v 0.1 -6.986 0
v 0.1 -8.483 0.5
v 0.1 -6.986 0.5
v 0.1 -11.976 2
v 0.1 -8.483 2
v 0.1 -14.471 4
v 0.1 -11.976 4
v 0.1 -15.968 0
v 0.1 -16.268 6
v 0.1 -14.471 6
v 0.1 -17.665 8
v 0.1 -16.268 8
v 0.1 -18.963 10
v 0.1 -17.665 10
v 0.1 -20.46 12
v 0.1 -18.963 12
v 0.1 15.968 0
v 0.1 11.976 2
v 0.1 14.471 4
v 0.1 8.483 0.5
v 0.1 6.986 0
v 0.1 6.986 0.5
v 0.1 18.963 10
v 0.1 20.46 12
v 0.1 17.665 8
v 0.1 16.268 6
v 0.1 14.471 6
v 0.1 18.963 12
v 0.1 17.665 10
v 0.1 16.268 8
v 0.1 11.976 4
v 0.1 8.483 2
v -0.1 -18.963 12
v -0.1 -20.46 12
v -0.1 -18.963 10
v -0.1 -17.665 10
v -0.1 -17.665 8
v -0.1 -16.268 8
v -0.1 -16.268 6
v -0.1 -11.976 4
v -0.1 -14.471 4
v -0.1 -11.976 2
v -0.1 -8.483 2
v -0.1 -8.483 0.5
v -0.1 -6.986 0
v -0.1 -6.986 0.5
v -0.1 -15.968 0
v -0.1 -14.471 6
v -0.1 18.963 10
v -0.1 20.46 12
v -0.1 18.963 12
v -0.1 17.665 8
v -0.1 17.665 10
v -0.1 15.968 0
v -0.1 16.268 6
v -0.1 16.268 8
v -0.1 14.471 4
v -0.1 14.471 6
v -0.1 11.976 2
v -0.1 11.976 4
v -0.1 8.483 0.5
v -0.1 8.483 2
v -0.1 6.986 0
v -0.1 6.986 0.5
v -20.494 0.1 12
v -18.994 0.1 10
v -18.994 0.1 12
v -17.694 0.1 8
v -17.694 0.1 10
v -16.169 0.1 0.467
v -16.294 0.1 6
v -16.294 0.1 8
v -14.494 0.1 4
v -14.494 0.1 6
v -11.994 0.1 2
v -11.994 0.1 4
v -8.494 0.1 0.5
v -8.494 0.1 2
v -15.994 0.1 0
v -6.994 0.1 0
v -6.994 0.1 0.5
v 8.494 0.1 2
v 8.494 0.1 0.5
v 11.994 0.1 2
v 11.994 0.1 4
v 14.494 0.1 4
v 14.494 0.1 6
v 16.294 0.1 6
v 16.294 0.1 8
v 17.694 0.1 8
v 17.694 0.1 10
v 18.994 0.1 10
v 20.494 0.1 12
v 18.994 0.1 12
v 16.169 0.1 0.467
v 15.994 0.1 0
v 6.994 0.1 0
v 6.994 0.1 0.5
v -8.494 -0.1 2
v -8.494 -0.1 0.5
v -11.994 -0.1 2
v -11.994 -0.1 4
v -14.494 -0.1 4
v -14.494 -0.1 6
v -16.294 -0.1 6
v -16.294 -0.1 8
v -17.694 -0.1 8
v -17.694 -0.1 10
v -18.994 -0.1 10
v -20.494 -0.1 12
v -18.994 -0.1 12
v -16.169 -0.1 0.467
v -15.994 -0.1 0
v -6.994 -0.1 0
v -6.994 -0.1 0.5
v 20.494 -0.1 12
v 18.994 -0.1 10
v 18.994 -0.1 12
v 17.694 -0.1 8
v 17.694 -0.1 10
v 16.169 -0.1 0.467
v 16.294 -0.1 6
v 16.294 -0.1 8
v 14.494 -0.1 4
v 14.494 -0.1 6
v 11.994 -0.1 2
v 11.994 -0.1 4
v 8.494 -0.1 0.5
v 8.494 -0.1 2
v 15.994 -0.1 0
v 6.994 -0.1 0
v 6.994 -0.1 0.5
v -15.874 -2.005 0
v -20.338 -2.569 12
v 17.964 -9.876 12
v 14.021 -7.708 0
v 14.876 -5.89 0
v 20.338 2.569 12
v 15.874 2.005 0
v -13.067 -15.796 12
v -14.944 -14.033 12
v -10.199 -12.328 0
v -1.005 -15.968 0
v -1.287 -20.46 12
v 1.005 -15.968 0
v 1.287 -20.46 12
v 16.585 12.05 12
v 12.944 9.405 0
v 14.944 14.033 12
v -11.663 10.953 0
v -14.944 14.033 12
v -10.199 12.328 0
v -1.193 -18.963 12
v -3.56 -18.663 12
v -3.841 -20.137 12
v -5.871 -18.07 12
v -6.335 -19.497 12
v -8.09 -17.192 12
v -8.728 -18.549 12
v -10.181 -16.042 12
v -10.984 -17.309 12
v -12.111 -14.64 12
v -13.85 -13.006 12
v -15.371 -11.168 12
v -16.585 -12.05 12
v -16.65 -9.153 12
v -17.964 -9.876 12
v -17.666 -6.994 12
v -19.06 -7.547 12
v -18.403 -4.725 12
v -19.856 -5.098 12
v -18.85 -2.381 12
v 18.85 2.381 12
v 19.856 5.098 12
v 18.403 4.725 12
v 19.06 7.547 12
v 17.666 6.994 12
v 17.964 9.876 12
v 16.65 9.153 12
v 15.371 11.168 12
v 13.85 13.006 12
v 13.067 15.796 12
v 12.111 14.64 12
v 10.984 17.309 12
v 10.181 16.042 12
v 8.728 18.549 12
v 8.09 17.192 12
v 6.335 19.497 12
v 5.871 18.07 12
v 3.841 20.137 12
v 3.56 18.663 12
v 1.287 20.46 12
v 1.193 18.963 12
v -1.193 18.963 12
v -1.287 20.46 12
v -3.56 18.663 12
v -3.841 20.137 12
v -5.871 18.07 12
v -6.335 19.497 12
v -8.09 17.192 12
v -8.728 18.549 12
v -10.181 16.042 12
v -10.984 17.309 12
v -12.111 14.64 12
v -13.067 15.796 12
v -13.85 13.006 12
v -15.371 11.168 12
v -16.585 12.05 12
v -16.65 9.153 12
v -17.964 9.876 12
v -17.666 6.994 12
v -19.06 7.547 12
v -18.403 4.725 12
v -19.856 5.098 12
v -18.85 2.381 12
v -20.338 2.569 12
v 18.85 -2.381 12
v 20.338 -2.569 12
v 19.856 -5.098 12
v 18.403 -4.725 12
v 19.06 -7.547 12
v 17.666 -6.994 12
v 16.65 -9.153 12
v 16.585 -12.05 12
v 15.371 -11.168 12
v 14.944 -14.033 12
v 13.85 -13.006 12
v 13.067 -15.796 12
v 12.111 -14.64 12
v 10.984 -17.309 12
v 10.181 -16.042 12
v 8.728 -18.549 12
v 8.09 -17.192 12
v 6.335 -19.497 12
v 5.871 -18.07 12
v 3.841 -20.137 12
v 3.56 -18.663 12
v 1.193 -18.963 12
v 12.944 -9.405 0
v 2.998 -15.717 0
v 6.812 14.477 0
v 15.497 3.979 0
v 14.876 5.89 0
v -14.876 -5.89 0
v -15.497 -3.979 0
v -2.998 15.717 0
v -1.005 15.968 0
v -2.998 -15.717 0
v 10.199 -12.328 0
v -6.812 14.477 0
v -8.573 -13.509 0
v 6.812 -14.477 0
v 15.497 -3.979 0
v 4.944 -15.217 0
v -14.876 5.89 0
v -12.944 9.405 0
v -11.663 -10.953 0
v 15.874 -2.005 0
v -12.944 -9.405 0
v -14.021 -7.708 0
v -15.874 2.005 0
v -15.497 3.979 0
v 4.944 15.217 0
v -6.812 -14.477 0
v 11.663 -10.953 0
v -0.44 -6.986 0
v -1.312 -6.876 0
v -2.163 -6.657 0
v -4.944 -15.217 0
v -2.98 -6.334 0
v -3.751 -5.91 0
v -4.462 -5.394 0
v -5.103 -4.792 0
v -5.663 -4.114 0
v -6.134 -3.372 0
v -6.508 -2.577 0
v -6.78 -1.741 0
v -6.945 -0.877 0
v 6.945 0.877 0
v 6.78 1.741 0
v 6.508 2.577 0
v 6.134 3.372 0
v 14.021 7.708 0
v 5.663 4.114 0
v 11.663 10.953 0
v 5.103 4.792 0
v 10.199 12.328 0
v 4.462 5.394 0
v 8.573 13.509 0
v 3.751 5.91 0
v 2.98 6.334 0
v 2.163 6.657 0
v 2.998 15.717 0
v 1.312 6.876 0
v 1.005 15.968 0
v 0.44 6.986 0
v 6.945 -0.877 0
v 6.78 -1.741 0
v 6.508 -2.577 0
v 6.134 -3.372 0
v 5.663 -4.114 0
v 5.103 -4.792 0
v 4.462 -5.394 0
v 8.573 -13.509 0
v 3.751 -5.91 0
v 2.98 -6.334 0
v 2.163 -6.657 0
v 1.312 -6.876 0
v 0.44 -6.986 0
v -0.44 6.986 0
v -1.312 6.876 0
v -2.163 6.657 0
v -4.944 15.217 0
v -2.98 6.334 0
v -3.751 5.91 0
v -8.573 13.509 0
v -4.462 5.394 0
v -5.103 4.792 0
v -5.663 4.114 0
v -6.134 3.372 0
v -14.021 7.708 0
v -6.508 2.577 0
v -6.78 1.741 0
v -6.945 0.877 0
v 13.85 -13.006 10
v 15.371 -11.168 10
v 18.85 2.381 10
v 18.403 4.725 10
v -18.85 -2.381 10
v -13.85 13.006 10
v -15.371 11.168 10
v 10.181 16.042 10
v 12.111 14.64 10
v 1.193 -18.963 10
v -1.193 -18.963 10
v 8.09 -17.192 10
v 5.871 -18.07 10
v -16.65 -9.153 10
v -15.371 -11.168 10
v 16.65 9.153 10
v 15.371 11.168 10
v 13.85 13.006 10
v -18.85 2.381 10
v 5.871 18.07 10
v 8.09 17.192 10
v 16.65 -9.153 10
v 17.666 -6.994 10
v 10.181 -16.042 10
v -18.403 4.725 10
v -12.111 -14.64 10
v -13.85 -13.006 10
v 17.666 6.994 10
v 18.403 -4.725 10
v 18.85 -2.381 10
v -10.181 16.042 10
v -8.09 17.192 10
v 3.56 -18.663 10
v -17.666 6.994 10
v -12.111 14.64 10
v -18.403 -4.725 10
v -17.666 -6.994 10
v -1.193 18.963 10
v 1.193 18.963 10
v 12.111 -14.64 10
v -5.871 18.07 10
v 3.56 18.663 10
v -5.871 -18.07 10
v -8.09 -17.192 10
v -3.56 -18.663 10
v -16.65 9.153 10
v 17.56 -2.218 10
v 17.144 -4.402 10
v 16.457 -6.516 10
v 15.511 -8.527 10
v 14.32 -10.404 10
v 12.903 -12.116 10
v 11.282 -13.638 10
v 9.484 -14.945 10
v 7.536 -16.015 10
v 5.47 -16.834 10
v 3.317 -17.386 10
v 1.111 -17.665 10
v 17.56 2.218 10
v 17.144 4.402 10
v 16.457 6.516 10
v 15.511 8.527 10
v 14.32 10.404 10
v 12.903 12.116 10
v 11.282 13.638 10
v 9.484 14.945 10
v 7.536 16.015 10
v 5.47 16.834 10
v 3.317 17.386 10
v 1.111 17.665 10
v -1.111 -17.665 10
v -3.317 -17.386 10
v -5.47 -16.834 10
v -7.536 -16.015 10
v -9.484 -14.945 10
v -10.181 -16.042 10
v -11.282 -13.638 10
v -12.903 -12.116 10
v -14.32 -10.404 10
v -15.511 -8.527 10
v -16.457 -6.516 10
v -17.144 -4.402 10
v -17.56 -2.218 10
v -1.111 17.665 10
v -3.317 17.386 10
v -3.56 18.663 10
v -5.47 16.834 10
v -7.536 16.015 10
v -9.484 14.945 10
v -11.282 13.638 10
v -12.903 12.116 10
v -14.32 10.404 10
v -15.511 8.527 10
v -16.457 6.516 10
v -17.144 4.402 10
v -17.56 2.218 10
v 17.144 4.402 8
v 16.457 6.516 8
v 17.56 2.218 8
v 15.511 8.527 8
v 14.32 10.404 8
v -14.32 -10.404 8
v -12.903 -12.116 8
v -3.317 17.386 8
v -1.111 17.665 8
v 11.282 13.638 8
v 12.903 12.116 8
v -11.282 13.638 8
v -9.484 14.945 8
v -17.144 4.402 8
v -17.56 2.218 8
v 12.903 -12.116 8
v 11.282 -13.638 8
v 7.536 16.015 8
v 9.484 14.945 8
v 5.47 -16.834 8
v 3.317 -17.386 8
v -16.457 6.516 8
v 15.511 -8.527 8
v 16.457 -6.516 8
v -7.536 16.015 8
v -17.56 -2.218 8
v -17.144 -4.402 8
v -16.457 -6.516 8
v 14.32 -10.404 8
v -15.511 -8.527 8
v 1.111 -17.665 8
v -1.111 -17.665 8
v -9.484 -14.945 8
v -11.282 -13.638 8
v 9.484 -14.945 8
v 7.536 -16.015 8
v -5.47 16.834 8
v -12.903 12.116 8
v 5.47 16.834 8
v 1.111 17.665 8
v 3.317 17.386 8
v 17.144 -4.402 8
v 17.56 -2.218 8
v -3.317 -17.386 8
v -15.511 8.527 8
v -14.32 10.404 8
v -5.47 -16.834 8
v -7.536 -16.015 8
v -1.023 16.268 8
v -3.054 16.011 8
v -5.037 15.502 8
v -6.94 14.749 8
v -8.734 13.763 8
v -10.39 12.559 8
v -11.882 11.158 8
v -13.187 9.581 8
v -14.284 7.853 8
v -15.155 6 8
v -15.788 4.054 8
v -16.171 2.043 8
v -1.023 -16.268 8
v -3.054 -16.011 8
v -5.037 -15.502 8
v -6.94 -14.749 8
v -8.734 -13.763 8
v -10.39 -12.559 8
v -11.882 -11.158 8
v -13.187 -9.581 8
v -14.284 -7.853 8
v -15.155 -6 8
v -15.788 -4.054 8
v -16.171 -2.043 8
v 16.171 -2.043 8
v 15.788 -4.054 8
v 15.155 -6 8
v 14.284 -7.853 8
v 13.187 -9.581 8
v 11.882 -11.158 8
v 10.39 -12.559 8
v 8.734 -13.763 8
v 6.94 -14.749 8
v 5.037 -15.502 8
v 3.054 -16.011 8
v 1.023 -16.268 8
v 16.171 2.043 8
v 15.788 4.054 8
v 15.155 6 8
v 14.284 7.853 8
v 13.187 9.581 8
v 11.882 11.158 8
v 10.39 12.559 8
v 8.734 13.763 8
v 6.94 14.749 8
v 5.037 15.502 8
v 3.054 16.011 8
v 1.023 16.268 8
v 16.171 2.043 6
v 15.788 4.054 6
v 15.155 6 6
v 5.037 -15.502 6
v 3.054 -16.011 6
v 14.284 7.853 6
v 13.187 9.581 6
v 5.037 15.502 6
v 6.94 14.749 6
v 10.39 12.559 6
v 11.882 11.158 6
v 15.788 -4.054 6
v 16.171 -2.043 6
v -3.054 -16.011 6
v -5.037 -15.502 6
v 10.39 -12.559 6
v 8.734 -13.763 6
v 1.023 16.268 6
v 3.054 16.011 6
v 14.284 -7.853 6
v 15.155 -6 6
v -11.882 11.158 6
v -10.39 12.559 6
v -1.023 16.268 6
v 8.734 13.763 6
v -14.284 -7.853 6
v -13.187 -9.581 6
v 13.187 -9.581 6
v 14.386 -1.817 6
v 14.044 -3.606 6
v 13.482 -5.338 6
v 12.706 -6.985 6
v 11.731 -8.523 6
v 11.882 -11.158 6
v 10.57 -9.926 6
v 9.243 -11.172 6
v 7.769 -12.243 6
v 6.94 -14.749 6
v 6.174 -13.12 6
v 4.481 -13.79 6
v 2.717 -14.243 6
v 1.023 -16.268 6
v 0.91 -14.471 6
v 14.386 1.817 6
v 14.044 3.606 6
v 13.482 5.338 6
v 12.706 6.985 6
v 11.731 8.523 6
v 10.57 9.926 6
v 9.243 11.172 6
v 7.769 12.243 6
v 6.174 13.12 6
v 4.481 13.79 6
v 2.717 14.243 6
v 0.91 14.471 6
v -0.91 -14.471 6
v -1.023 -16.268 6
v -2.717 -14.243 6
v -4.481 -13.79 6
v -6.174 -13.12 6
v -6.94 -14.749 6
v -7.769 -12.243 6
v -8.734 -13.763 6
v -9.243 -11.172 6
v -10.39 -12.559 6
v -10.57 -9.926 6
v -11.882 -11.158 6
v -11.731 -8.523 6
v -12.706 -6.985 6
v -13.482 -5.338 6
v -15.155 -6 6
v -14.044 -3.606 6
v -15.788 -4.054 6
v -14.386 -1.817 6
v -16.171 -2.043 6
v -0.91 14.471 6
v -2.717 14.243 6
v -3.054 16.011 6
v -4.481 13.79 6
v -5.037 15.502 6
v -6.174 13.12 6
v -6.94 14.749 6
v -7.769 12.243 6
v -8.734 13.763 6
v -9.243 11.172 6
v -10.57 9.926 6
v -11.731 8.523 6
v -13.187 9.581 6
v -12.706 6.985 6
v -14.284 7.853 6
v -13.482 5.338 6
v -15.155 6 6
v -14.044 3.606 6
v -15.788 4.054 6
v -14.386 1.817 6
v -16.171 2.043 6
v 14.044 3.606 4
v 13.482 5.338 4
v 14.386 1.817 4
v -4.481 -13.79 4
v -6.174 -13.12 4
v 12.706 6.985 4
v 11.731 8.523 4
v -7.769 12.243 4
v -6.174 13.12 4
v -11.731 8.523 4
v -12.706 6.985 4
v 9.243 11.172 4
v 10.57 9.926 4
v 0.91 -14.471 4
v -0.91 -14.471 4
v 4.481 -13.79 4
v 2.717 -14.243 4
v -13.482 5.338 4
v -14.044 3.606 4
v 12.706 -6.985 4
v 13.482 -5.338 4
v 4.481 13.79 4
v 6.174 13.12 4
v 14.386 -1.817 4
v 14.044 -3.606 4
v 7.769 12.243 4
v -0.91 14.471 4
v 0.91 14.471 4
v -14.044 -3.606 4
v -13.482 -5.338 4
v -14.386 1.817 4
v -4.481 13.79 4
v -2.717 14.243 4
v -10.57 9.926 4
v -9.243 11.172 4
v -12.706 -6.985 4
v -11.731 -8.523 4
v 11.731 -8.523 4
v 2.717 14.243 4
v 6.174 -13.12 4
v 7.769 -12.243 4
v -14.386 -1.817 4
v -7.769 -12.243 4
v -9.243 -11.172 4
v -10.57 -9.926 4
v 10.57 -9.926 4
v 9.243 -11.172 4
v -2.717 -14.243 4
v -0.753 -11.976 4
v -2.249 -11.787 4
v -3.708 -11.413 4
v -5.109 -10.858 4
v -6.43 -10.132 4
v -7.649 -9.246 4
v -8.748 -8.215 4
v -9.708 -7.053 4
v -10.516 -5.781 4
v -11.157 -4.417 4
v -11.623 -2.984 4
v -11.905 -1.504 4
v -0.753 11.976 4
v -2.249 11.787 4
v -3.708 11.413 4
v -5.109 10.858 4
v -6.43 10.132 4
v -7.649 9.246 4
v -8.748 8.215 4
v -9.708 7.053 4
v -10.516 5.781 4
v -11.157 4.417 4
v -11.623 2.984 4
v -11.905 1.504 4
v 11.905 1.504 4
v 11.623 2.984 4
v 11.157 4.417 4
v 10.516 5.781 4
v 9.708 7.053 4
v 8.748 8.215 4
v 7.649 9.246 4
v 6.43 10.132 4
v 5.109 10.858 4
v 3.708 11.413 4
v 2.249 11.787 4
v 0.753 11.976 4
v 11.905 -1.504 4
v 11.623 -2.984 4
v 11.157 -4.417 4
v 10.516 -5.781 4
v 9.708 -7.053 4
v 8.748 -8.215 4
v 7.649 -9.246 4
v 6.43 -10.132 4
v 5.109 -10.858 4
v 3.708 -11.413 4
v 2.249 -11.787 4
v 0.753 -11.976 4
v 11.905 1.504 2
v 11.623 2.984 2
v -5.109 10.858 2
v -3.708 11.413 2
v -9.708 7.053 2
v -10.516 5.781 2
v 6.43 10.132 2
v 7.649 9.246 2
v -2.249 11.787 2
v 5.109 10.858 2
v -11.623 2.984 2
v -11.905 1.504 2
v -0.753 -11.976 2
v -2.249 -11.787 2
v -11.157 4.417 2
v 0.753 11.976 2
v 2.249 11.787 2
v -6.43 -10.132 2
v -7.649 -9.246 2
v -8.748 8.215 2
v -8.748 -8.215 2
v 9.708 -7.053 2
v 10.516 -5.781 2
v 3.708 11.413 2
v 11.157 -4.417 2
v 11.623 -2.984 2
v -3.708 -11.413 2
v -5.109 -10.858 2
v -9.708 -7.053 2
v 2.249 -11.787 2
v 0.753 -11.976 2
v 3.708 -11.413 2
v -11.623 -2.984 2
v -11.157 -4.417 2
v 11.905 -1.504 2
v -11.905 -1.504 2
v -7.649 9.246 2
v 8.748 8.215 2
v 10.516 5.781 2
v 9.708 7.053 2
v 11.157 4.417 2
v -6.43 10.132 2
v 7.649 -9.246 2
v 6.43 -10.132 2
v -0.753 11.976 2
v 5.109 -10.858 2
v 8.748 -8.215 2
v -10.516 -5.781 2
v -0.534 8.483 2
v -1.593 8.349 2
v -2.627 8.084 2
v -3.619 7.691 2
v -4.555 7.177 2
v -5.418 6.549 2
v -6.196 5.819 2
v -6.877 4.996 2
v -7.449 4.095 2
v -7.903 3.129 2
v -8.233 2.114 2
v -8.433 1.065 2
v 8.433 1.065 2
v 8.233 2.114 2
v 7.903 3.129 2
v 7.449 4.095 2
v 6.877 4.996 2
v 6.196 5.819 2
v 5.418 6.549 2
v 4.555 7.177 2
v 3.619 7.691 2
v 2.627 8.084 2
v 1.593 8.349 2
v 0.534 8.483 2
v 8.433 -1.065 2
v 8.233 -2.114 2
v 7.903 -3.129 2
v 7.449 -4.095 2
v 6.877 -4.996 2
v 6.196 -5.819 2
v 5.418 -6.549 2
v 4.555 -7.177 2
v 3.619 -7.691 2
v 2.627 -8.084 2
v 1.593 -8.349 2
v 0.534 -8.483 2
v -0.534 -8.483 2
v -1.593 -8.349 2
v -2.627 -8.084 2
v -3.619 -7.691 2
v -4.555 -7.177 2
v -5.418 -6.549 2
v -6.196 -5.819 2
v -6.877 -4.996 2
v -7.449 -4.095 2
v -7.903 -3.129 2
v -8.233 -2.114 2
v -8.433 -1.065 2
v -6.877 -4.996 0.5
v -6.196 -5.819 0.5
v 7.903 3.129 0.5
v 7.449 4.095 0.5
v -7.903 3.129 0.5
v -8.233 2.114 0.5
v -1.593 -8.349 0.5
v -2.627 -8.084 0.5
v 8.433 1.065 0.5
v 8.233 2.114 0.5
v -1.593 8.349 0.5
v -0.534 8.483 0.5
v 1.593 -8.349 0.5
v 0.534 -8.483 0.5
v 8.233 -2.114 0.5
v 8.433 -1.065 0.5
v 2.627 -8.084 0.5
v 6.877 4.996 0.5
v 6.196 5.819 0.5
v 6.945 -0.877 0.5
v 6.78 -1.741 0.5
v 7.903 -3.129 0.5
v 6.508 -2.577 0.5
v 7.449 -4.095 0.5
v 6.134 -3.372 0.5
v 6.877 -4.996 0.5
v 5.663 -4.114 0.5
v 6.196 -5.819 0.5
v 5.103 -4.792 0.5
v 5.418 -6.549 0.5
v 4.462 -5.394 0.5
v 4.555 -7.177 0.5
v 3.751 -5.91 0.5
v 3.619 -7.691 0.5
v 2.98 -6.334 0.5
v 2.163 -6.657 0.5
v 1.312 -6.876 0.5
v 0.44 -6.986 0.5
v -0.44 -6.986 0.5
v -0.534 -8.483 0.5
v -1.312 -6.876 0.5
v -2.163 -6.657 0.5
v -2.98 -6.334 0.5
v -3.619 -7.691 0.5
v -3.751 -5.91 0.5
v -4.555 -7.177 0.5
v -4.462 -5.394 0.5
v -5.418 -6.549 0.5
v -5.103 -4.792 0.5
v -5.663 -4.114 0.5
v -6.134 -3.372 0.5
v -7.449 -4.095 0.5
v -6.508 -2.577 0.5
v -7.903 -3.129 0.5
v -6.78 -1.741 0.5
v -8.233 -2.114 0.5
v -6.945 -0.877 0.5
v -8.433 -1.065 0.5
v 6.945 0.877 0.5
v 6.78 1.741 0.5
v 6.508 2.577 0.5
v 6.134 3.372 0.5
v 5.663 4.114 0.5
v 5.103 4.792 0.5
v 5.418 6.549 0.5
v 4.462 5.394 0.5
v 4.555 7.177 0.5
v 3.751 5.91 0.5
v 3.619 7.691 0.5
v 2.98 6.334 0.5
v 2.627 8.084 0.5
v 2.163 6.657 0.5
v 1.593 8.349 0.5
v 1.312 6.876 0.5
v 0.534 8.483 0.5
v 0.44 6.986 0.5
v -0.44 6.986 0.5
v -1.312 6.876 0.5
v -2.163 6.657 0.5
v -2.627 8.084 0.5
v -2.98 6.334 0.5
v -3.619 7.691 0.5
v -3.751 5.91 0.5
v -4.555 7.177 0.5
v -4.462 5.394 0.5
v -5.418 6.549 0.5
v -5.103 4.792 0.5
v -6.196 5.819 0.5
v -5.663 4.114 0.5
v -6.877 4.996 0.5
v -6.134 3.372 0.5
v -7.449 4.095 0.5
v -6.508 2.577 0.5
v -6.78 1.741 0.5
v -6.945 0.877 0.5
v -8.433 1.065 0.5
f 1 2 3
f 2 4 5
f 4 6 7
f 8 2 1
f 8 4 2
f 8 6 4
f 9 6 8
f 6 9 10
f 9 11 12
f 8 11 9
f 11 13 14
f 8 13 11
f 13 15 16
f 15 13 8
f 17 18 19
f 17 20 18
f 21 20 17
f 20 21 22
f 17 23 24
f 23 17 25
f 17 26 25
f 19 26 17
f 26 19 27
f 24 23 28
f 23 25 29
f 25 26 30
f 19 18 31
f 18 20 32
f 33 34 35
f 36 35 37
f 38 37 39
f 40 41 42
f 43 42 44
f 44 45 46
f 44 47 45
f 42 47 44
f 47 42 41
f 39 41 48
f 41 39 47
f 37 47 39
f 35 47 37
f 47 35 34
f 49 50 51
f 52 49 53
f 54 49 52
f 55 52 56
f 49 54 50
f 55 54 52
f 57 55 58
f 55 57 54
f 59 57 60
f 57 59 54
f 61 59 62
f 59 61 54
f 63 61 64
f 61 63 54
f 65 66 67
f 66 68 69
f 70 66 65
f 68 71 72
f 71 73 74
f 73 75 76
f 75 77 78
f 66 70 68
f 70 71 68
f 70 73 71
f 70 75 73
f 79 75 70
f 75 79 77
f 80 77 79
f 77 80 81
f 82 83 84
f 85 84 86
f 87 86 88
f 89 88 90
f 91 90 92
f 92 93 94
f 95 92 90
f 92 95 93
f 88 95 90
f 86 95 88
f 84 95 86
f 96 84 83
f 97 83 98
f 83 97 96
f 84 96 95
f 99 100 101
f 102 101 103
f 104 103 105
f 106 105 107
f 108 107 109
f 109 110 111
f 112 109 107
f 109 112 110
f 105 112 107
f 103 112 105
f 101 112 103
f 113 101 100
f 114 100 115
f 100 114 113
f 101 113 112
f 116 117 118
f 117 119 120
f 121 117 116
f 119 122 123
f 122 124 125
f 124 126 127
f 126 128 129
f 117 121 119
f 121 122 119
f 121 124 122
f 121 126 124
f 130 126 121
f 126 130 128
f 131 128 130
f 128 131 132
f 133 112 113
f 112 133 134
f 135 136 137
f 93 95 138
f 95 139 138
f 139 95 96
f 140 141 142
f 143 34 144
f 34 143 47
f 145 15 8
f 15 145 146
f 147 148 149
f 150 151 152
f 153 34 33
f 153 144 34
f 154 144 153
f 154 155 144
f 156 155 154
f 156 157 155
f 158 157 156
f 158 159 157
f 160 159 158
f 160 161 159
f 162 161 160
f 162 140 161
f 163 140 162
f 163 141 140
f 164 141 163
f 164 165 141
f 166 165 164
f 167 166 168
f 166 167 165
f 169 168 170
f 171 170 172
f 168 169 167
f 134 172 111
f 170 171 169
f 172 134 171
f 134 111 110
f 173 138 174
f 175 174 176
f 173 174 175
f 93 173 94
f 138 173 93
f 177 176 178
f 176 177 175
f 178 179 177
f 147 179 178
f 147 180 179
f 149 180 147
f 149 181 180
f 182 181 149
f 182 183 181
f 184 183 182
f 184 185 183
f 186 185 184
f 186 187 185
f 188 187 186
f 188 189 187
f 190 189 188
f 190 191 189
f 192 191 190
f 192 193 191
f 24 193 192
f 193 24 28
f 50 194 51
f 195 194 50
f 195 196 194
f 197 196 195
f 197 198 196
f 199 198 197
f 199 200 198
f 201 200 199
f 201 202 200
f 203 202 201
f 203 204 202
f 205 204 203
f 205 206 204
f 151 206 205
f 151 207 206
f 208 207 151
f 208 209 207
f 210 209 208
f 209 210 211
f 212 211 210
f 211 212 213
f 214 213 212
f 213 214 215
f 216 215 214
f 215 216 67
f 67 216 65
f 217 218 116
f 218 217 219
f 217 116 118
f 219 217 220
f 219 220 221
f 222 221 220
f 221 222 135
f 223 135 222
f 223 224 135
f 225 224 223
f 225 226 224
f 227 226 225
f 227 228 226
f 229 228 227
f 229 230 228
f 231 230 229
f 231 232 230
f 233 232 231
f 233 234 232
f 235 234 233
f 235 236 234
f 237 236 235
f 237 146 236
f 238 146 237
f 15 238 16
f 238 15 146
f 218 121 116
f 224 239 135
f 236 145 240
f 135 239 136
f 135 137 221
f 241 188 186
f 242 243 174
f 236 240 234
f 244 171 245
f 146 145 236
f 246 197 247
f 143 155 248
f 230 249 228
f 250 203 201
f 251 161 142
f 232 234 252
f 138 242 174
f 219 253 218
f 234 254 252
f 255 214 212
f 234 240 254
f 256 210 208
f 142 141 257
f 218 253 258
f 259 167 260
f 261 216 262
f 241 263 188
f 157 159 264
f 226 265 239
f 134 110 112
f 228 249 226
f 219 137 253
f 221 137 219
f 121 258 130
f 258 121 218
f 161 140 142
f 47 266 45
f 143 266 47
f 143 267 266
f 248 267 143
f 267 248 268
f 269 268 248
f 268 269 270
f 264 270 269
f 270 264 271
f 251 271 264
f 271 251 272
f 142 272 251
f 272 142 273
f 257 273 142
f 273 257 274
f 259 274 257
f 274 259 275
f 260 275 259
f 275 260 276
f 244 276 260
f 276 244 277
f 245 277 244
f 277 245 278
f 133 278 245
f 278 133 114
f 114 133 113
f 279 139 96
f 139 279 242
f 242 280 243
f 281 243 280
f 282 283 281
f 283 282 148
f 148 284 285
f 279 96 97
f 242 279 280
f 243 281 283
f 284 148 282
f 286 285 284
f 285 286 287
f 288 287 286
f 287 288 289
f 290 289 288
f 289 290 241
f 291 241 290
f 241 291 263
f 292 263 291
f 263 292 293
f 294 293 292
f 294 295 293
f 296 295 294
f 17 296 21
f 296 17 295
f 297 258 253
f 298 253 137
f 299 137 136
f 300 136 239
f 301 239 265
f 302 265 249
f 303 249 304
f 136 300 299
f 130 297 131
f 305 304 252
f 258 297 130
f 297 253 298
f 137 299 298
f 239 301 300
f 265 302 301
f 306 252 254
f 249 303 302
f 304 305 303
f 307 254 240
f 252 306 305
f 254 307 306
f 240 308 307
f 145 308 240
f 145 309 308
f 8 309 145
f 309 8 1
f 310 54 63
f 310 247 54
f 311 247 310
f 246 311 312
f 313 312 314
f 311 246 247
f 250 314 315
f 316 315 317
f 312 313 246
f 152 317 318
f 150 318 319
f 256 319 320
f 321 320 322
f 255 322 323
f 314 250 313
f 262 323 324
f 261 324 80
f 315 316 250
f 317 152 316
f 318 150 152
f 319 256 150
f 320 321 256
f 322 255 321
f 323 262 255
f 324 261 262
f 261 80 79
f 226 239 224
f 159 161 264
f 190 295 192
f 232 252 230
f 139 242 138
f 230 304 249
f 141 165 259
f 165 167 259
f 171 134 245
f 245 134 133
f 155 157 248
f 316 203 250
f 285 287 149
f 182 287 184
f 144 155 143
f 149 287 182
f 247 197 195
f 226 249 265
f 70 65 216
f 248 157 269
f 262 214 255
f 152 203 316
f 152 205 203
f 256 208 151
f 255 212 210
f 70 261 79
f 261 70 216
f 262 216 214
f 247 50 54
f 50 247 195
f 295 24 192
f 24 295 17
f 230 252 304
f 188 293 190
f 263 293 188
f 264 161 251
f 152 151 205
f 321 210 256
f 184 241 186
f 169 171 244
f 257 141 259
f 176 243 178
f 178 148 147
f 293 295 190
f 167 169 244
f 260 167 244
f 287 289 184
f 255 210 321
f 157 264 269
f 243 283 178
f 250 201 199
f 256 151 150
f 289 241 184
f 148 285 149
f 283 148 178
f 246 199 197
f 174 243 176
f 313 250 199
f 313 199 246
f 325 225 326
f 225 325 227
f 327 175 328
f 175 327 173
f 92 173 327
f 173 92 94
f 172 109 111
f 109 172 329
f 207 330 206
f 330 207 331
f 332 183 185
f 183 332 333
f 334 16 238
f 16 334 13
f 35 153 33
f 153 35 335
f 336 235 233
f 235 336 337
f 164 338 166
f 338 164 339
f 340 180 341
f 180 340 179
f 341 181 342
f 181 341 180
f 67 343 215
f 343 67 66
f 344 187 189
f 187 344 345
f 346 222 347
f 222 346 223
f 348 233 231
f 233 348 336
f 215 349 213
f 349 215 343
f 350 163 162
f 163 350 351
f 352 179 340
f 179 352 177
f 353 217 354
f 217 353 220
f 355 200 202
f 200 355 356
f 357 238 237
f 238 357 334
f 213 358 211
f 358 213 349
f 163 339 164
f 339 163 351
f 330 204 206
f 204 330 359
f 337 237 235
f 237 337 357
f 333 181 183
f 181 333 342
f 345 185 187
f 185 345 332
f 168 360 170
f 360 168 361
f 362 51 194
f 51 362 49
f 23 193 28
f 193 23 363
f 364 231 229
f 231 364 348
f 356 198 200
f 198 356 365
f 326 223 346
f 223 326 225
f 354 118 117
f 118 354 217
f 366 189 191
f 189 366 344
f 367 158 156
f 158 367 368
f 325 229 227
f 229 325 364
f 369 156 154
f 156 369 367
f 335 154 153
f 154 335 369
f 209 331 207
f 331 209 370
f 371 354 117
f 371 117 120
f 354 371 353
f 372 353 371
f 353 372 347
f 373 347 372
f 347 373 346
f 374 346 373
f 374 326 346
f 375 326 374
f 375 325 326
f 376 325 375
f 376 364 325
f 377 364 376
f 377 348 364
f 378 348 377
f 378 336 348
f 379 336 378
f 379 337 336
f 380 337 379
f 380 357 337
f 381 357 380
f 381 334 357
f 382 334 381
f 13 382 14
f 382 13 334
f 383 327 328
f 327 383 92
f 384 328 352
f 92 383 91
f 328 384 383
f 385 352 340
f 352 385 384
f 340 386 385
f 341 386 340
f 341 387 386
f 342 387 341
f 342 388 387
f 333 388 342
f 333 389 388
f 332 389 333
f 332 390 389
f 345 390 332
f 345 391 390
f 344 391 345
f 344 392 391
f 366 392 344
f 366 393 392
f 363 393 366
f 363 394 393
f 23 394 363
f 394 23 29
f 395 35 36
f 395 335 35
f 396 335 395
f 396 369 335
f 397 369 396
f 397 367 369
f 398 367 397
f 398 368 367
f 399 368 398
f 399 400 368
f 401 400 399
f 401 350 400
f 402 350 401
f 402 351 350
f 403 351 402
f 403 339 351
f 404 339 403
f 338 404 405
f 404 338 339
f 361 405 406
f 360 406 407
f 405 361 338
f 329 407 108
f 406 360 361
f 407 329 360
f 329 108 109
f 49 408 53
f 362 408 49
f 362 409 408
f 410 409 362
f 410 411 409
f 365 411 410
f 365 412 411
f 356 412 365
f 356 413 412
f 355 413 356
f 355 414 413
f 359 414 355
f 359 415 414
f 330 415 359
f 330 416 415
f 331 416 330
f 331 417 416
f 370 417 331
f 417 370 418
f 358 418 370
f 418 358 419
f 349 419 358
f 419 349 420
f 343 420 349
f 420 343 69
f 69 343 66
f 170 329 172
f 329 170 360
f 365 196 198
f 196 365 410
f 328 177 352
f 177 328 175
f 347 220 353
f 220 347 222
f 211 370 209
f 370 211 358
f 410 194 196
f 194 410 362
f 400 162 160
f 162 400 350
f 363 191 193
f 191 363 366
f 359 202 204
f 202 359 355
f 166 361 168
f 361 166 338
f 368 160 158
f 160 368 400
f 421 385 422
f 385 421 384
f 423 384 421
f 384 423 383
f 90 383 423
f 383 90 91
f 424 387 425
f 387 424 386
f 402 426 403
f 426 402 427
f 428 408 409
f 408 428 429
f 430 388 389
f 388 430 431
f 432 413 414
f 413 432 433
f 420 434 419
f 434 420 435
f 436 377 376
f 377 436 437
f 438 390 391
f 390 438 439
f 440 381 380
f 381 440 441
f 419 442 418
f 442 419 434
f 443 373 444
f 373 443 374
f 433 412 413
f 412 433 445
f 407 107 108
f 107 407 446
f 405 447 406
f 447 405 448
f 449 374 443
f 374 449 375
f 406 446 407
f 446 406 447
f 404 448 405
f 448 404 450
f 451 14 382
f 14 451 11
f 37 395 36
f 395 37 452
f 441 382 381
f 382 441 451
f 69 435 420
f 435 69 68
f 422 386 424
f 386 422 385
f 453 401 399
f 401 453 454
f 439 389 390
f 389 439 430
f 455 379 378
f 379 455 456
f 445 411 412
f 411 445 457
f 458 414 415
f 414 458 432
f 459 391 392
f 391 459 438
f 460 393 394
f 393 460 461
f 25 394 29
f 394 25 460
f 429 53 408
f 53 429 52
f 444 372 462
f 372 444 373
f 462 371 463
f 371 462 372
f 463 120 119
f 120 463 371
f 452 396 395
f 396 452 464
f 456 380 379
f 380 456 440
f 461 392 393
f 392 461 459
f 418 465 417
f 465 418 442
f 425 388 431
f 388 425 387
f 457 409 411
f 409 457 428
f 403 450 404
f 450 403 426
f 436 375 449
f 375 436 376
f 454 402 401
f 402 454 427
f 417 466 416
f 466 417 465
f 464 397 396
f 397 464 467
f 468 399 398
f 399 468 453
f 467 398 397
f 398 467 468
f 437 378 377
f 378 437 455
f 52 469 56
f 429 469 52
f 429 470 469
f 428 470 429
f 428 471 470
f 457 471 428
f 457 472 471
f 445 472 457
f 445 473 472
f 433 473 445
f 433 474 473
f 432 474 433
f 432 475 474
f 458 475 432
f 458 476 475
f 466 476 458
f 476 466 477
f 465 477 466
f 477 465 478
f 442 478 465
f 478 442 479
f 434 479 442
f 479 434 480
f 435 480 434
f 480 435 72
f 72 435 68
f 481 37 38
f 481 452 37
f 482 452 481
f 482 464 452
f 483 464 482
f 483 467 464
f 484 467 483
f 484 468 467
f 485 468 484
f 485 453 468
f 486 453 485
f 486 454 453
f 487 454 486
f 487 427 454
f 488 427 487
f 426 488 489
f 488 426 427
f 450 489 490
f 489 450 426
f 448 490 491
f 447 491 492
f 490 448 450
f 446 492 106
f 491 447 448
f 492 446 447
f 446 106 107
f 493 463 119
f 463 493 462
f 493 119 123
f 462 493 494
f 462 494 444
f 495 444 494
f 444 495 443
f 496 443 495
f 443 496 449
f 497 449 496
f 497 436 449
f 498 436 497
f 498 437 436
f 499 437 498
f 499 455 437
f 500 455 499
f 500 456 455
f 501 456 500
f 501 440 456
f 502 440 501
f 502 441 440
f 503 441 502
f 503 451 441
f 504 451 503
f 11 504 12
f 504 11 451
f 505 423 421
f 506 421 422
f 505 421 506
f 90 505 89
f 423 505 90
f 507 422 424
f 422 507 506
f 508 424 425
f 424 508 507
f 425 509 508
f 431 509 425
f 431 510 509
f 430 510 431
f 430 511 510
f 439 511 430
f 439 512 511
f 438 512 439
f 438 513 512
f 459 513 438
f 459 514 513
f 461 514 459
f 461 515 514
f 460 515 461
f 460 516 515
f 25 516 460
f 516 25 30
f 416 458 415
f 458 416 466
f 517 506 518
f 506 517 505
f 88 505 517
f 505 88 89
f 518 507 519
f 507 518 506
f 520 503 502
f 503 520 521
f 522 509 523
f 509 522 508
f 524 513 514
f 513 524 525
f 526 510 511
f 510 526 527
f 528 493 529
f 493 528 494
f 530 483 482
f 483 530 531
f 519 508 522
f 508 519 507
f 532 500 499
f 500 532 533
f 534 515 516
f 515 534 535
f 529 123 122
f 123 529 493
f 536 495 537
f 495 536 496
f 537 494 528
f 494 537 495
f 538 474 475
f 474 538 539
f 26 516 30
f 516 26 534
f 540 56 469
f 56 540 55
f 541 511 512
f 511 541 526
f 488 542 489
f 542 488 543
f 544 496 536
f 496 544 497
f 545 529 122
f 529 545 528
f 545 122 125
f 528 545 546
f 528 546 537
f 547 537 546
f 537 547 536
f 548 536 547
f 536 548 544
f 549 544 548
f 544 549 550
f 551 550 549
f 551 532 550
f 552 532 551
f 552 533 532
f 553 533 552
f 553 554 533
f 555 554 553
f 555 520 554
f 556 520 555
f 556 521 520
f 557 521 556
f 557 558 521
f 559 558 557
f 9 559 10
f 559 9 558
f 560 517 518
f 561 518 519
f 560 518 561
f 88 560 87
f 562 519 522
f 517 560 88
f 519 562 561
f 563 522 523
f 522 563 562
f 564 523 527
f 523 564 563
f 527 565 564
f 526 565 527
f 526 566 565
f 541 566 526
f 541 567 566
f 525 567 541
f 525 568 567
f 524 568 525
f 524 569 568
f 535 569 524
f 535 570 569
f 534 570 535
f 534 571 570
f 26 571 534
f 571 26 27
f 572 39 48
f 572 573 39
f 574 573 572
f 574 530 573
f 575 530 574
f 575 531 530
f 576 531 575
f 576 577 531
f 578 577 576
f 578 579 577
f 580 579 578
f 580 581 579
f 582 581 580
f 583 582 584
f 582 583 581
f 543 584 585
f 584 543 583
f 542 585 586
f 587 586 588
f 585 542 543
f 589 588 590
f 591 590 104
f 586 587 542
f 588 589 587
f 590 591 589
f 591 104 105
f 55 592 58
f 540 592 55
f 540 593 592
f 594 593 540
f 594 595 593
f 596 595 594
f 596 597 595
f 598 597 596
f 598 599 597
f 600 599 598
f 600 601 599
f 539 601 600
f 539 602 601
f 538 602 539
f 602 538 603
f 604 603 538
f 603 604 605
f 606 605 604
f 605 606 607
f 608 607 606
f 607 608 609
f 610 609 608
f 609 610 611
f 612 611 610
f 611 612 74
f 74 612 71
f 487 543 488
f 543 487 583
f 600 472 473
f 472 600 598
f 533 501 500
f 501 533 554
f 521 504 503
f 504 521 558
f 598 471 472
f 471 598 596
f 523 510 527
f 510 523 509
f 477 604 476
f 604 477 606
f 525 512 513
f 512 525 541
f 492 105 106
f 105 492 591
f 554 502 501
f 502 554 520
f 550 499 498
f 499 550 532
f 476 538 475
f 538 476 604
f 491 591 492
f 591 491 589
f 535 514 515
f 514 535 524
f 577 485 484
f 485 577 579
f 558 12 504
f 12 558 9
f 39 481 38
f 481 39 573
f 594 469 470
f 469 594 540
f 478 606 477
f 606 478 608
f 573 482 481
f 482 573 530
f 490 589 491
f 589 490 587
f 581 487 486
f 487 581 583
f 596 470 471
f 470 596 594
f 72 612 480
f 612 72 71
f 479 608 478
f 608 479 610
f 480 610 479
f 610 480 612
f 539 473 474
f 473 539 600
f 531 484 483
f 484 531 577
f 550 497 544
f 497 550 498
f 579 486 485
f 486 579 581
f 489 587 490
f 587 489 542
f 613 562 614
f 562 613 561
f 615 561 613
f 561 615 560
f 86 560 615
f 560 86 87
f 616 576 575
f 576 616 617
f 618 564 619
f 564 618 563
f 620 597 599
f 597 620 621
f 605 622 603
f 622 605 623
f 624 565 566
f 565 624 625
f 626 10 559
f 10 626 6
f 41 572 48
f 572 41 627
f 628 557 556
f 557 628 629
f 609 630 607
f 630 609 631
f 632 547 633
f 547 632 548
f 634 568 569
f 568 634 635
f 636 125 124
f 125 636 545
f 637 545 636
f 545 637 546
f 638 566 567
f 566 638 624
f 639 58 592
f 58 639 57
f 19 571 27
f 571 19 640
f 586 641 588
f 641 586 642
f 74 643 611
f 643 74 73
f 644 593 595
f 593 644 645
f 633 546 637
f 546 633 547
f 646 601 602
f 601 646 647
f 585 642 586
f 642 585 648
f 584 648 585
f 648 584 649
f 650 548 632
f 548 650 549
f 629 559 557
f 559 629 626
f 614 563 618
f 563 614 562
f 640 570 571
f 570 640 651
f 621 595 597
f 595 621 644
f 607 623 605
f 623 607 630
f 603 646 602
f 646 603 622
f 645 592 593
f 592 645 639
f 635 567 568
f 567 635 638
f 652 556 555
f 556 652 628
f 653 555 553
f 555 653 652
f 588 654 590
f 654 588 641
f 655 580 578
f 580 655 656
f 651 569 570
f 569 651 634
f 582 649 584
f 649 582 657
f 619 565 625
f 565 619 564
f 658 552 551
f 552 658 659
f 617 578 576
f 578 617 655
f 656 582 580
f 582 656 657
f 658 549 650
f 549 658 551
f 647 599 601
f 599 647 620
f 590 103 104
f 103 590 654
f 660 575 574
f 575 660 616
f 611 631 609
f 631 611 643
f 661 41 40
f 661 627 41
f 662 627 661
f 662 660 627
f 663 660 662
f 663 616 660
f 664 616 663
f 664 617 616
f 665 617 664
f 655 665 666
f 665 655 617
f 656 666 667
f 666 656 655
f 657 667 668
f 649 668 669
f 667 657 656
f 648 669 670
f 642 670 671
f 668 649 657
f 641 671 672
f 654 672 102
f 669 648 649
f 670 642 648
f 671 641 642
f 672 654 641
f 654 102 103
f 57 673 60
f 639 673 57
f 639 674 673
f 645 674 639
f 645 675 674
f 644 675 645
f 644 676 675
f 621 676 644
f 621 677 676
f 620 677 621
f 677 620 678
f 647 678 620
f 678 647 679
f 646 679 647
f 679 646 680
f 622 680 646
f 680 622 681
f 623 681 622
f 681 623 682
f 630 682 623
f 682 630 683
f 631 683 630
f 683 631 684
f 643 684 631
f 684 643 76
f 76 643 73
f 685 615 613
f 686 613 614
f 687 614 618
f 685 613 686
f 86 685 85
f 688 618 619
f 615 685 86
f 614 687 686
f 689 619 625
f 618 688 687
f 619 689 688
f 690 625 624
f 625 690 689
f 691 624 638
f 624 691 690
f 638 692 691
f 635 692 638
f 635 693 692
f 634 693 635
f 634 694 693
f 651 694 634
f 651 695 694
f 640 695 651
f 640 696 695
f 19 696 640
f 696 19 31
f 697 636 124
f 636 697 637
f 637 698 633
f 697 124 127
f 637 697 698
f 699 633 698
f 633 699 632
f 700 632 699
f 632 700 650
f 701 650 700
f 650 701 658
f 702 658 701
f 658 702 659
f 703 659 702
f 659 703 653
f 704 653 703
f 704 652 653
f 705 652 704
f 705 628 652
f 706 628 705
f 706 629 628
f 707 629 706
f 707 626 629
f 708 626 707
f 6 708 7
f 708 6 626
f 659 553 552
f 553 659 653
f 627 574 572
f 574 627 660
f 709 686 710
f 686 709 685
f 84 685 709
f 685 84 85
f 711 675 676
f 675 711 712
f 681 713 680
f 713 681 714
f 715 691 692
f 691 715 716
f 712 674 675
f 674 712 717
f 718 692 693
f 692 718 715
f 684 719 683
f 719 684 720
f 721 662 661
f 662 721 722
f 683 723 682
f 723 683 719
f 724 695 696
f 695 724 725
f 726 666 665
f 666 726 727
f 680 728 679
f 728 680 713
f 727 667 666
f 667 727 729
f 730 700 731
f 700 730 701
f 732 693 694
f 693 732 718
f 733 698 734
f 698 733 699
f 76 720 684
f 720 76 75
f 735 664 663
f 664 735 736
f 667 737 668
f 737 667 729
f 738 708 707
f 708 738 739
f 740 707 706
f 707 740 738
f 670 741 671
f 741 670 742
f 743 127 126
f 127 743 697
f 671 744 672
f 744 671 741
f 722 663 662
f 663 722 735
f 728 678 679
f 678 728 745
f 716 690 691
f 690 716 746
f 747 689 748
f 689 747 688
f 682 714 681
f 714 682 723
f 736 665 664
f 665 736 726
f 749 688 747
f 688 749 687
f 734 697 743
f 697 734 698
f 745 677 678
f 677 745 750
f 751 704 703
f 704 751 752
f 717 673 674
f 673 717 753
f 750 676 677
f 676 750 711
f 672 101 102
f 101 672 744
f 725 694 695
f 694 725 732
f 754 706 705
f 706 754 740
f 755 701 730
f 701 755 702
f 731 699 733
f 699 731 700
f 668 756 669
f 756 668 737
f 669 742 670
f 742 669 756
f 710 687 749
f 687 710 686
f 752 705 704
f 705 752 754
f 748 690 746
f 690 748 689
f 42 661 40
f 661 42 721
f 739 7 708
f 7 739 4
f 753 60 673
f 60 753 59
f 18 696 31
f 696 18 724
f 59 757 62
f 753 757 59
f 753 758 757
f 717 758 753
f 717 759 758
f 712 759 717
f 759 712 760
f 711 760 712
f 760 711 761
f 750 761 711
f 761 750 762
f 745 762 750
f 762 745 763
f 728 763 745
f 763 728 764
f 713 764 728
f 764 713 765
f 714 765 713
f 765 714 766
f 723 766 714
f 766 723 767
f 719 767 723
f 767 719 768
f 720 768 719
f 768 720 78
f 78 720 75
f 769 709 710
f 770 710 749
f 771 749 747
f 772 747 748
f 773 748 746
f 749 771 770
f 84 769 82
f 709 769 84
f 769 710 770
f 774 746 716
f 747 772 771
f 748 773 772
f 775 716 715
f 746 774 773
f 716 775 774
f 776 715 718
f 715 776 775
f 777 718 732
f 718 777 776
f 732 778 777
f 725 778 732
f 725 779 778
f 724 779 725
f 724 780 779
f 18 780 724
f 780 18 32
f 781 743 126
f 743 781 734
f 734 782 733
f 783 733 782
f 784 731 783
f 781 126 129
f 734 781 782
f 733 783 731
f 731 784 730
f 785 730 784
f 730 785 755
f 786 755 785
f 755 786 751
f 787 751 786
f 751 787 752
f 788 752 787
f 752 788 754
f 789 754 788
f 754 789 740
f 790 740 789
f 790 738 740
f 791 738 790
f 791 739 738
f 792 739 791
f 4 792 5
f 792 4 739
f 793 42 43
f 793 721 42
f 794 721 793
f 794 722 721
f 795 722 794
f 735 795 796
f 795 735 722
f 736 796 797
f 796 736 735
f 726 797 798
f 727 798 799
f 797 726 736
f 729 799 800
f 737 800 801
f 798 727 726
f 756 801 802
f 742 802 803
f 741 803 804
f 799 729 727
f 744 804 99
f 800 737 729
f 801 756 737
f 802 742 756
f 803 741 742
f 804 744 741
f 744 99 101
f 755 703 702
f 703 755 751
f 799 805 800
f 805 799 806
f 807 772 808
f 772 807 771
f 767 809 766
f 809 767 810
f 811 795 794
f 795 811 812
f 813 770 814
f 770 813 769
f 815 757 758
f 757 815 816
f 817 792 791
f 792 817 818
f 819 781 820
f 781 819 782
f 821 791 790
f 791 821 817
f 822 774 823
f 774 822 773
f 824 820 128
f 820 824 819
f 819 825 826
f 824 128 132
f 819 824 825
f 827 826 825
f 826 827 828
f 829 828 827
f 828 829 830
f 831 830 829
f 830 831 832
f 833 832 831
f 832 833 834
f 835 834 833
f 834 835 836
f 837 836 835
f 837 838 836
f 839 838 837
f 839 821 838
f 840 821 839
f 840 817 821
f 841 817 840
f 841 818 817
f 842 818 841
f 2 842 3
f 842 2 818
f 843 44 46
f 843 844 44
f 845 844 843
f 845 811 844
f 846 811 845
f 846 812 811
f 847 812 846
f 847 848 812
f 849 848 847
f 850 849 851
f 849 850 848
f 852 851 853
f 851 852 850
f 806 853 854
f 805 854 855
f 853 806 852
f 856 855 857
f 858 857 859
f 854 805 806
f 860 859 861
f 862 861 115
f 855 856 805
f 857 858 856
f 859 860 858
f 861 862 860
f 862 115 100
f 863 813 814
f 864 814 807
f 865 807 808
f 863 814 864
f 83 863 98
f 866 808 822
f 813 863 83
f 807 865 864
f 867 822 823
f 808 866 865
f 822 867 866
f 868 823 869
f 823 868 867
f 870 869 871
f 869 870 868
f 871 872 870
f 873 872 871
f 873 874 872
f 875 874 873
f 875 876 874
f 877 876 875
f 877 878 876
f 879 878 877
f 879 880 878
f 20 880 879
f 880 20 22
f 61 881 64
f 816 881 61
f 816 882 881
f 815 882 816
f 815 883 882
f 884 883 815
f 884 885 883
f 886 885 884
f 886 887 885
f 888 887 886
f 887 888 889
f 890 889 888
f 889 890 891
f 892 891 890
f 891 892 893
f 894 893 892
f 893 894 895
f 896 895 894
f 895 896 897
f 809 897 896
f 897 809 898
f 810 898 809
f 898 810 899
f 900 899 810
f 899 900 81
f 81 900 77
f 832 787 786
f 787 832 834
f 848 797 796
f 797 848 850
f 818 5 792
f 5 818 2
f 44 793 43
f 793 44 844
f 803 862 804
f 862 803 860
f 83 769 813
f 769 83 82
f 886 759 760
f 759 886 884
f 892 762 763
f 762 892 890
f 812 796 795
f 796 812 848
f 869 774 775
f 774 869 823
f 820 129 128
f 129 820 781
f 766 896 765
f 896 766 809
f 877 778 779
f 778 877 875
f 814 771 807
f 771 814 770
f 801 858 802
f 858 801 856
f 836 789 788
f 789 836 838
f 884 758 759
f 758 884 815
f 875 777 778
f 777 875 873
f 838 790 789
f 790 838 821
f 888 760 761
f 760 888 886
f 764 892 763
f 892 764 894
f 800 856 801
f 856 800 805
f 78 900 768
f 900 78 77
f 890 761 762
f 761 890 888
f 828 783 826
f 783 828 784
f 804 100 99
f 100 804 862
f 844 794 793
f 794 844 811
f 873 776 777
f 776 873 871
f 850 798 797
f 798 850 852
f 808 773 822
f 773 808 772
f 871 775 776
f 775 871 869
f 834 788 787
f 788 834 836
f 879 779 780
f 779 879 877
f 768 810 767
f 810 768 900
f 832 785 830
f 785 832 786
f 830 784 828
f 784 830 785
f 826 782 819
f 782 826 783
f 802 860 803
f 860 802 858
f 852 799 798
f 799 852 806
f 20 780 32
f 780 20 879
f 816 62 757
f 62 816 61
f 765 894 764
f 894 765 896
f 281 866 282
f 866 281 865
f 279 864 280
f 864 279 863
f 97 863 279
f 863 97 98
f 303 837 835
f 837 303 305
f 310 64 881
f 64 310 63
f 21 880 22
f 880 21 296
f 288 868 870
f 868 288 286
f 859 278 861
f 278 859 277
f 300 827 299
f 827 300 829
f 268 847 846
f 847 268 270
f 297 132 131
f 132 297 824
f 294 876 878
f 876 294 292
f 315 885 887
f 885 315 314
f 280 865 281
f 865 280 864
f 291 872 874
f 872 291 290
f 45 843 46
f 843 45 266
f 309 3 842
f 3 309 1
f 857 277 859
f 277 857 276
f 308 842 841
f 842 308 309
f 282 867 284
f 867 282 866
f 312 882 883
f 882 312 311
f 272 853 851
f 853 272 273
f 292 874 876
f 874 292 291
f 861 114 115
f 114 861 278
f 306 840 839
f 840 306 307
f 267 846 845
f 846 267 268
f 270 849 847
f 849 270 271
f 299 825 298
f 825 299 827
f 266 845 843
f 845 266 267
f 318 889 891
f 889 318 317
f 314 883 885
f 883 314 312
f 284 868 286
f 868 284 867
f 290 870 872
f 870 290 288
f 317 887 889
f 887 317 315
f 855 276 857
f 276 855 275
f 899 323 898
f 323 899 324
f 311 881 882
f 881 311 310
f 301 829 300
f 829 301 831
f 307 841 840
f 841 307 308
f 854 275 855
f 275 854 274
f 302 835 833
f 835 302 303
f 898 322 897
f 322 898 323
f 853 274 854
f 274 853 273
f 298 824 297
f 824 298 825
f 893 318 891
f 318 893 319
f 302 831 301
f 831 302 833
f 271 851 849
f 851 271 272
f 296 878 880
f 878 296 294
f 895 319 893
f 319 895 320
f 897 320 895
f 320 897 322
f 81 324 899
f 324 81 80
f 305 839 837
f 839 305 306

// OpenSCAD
//debug();


//ball();
supports();
//soluble_supports();


module debug() {
    intersection() {
        union() {
            ball();

            supports();
            
            //soluble_supports();
        }

        translate([0, 50/2, 0])
        cube([50, 50, 100], center=true);
    }
}


module ball() {
    translate([0, 0, 40/2 + 1])
    sphere(d=40, $fn=100);
}

module supports(splits=true) {
    difference() {
        cylinder(d1=32, d2=41, h=12, $fn=50);

        // contours
        translate([0, 0, 10])
        cylinder(d=38, h=12, $fn=50);

        translate([0, 0, 8])
        cylinder(d=35.4, h=12, $fn=50);

        translate([0, 0, 6])
        cylinder(d=32.6, h=12, $fn=50);

        translate([0, 0, 4])
        cylinder(d=29, h=12, $fn=50);

        translate([0, 0, 2])
        cylinder(d=24, h=12, $fn=50);

        translate([0, 0, 0.5])
        cylinder(d=17, h=12, $fn=50);

        translate([0, 0, -0.5])
        cylinder(d=14, h=12, $fn=50);

        if (splits) {
            // splits
            cube([0.2, 50, 60], center=true);
            cube([50, 0.2, 60], center=true);
        }
    }
}

module soluble_supports() {
    difference() {
        cylinder(d1=31.5, d2=40, h=12);

        supports(splits=false);

        ball();
    }
}
